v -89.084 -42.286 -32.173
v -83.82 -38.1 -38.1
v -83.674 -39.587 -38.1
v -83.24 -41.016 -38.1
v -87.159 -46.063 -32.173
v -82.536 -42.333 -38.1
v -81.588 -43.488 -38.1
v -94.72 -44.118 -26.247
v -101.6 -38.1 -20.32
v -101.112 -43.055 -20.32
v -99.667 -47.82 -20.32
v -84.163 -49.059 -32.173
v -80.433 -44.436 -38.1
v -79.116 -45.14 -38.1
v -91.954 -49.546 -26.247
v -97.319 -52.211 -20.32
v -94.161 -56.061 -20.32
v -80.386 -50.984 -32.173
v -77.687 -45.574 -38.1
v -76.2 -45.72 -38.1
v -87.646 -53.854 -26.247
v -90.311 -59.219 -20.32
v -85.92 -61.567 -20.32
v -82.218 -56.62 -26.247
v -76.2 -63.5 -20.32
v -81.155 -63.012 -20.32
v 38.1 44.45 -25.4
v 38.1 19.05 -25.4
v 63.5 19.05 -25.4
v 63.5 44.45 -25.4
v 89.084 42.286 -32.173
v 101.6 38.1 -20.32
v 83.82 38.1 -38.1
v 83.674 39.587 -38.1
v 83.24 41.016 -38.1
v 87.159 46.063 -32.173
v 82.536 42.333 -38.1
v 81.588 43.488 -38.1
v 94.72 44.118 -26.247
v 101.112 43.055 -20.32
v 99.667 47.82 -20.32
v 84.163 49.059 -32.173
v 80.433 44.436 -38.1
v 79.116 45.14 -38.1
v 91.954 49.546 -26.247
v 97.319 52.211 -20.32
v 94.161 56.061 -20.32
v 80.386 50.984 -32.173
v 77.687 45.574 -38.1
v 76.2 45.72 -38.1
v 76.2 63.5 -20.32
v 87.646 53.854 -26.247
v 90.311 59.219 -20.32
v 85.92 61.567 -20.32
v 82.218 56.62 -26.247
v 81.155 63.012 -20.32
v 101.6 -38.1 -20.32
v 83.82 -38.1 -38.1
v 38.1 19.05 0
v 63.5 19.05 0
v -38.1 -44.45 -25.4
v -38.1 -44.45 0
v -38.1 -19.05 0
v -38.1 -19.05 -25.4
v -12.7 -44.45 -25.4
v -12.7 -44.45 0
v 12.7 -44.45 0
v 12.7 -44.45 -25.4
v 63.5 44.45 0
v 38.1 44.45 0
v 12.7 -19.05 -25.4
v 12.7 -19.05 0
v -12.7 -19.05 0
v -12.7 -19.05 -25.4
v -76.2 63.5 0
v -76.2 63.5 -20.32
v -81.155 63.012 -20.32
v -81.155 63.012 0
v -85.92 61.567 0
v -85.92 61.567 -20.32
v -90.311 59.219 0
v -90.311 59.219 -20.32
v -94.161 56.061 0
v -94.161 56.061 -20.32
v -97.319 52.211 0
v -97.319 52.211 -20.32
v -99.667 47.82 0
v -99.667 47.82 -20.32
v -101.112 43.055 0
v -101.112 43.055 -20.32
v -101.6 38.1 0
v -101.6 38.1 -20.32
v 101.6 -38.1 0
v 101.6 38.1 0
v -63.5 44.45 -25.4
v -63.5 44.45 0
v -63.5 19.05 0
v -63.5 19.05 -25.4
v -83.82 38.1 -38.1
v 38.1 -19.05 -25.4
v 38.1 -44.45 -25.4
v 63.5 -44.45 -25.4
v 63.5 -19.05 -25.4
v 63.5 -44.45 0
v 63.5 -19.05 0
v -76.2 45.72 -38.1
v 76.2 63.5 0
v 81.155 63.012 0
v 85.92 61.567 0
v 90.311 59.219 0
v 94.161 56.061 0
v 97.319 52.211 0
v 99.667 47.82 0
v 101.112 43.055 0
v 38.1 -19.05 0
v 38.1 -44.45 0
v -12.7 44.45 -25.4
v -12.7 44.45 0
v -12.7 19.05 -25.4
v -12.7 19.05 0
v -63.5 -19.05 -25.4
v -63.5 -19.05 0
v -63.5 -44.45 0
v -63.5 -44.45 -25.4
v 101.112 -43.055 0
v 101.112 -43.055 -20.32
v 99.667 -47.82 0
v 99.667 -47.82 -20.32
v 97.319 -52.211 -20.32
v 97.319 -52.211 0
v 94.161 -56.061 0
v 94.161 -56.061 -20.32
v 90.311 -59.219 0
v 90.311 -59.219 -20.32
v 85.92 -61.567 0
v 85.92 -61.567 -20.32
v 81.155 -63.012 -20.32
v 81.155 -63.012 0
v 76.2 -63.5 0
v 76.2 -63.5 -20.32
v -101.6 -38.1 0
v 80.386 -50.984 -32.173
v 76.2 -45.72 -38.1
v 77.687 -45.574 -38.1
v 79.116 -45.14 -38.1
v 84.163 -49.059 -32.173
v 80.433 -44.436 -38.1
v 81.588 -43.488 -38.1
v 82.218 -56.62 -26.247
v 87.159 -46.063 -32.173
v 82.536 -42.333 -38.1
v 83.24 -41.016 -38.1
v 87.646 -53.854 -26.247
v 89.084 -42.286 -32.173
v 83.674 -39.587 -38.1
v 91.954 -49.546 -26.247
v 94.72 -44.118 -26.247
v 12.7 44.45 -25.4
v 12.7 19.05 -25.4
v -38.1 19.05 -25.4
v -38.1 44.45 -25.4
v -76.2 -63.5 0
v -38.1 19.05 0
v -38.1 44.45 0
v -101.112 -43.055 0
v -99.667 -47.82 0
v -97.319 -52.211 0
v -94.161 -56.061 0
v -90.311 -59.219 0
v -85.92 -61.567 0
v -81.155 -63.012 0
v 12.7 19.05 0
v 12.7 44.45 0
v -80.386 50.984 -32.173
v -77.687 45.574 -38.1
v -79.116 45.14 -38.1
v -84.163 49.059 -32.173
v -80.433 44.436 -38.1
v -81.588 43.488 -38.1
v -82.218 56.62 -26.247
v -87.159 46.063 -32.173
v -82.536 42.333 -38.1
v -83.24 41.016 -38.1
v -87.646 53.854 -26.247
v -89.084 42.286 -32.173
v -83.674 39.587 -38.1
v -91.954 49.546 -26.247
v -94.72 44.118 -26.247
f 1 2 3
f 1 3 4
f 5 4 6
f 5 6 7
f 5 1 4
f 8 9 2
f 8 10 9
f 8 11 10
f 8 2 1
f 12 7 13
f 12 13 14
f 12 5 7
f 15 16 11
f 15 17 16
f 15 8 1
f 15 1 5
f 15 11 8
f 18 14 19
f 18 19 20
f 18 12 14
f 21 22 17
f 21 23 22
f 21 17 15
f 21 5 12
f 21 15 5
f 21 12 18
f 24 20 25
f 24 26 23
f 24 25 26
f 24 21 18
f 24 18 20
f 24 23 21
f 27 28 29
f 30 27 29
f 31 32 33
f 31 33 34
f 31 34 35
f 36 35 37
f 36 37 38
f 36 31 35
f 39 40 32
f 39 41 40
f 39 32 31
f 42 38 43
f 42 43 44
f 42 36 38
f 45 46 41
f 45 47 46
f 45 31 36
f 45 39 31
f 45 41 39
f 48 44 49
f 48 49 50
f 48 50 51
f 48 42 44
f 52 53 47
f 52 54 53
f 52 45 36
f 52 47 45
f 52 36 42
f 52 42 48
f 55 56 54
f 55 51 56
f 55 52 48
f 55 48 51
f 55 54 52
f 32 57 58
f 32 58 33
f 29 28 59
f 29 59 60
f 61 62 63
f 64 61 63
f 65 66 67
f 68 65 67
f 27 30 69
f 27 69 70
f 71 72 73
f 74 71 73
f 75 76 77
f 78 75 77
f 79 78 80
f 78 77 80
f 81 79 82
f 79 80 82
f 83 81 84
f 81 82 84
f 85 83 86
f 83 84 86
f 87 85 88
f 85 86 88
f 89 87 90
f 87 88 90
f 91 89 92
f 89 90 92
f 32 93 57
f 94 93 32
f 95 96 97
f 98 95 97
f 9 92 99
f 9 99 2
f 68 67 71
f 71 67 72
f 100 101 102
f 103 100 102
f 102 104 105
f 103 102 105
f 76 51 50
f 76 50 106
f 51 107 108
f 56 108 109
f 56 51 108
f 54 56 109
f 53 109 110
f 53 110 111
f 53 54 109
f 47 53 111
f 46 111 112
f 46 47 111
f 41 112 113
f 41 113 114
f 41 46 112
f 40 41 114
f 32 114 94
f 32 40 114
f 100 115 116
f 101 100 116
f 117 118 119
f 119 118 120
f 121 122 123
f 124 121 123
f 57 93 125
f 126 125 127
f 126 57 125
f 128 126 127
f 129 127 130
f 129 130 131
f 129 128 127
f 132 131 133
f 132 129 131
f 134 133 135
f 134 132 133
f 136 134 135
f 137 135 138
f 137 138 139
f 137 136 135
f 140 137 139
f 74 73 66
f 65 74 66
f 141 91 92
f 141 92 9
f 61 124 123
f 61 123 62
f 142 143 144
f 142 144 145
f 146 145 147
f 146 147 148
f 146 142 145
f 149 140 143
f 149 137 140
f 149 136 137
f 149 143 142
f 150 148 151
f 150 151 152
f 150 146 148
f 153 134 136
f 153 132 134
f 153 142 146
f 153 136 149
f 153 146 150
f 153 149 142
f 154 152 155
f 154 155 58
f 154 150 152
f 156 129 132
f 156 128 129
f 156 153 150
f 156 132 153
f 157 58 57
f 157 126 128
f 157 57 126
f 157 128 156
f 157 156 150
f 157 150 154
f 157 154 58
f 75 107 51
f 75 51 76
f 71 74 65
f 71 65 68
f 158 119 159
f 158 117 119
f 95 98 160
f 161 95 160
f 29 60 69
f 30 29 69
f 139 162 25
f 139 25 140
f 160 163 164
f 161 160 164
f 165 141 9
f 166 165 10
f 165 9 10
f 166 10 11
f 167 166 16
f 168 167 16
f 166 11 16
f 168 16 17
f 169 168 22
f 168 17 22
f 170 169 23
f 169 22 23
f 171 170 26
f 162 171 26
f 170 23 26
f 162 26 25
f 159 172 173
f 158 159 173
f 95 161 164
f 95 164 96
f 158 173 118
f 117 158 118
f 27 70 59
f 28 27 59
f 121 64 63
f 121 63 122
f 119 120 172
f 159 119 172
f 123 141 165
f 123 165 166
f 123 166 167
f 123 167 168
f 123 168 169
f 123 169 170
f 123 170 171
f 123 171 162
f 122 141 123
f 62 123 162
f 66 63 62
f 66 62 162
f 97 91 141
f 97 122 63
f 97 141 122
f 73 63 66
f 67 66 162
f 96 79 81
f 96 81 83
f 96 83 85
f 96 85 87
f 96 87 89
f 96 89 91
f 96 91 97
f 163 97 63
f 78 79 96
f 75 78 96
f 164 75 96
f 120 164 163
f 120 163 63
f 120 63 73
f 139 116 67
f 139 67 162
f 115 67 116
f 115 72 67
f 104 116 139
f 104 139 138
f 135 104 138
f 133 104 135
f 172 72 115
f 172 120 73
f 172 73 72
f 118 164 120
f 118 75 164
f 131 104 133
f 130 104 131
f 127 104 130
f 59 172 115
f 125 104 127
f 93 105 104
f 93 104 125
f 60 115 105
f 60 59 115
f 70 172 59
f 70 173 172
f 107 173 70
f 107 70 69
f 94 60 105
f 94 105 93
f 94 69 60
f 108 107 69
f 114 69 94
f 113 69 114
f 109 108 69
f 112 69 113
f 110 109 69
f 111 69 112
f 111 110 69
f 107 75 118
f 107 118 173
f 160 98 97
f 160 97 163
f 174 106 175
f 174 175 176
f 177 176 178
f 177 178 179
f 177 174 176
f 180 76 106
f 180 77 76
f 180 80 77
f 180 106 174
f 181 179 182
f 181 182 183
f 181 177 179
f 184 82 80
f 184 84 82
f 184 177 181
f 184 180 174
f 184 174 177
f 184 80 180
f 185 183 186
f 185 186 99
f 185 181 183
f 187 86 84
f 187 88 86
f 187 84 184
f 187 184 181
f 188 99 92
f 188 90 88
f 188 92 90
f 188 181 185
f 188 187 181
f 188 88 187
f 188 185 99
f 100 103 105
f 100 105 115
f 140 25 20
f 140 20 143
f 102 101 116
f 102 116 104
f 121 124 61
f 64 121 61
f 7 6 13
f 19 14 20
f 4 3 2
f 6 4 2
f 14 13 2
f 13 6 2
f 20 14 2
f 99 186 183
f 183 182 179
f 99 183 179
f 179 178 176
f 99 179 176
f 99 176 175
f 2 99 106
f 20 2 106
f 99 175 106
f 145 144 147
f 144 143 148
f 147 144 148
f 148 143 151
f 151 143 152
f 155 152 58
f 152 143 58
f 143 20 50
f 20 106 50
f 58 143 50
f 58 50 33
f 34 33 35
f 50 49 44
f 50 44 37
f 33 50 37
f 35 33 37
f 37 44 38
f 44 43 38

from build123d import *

# Parameters (mm, degrees)
F0_W     = 12.7
F0_H     = 12.7
F1_DEPTH = 38.1
F2_DEPTH = 25.4
F3_R     = 25.4
F4_SIZE  = 17.78


with BuildPart() as f1:
    # F0 (on Top) → F1 (new body)
    with BuildSketch(Plane.XY):
        Polygon((101.6, 63.5), (-101.6, 63.5), (-101.6, 31.75), (-63.5, 31.75), (-63.5, 44.45), (-38.1, 44.45), (-38.1, 31.75), (-12.7, 31.75), (-12.7, 44.45), (12.7, 44.45), (12.7, 31.75), (38.1, 31.75), (38.1, 44.45), (63.5, 44.45), (63.5, 31.75), (101.6, 31.75), align=None)
        Polygon((-63.5, 31.75), (-101.6, 31.75), (-101.6, -31.75), (-63.5, -31.75), (-63.5, -19.05), (-38.1, -19.05), (-38.1, -31.75), (-12.7, -31.75), (-12.7, -19.05), (0, -19.05), (0, 0), (0, 19.05), (-12.7, 19.05), (-12.7, 31.75), (-38.1, 31.75), (-38.1, 19.05), (-63.5, 19.05), align=None)
        Polygon((101.6, -31.75), (101.6, 31.75), (63.5, 31.75), (63.5, 19.05), (38.1, 19.05), (38.1, 31.75), (12.7, 31.75), (12.7, 19.05), (0, 19.05), (0, 0), (0, -19.05), (12.7, -19.05), (12.7, -31.75), (38.1, -31.75), (38.1, -19.05), (63.5, -19.05), (63.5, -31.75), align=None)
        Polygon((-63.5, -31.75), (-101.6, -31.75), (-101.6, -63.5), (101.6, -63.5), (101.6, -31.75), (63.5, -31.75), (63.5, -44.45), (38.1, -44.45), (38.1, -31.75), (12.7, -31.75), (12.7, -44.45), (-12.7, -44.45), (-12.7, -31.75), (-38.1, -31.75), (-38.1, -44.45), (-63.5, -44.45), align=None)
        Polygon((-50.8, 31.75), (-63.5, 31.75), (-63.5, 19.05), (-38.1, 19.05), (-38.1, 31.75), align=None)
        Polygon((-63.5, 44.45), (-63.5, 31.75), (-50.8, 31.75), (-38.1, 31.75), (-38.1, 44.45), align=None)
        Polygon((-12.7, 44.45), (-12.7, 31.75), (0, 31.75), (12.7, 31.75), (12.7, 44.45), align=None)
        with Locations((-6.35, 25.4)):
            Rectangle(F0_W, F0_H)
        with Locations((6.35, 25.4)):
            Rectangle(F0_W, F0_H)
        Polygon((63.5, 19.05), (63.5, 31.75), (50.8, 31.75), (38.1, 31.75), (38.1, 19.05), align=None)
        Polygon((50.8, 31.75), (63.5, 31.75), (63.5, 44.45), (38.1, 44.45), (38.1, 31.75), align=None)
        Polygon((50.8, -31.75), (63.5, -31.75), (63.5, -19.05), (38.1, -19.05), (38.1, -31.75), align=None)
        Polygon((63.5, -44.45), (63.5, -31.75), (50.8, -31.75), (38.1, -31.75), (38.1, -44.45), align=None)
        Polygon((0, -31.75), (-12.7, -31.75), (-12.7, -44.45), (12.7, -44.45), (12.7, -31.75), align=None)
        with Locations((-6.35, -25.4)):
            Rectangle(F0_W, F0_H)
        with Locations((6.35, -25.4)):
            Rectangle(F0_W, F0_H)
        Polygon((-63.5, -19.05), (-63.5, -31.75), (-50.8, -31.75), (-38.1, -31.75), (-38.1, -19.05), align=None)
        Polygon((-50.8, -31.75), (-63.5, -31.75), (-63.5, -44.45), (-38.1, -44.45), (-38.1, -31.75), align=None)
    extrude(amount=-F1_DEPTH)

    # F0 (on Top) → F2 (cut)
    with BuildSketch(Plane.XY):
        Polygon((-63.5, 44.45), (-63.5, 31.75), (-50.8, 31.75), (-38.1, 31.75), (-38.1, 44.45), align=None)
        Polygon((-50.8, 31.75), (-63.5, 31.75), (-63.5, 19.05), (-38.1, 19.05), (-38.1, 31.75), align=None)
        Polygon((-63.5, -19.05), (-63.5, -31.75), (-50.8, -31.75), (-38.1, -31.75), (-38.1, -19.05), align=None)
        Polygon((-50.8, -31.75), (-63.5, -31.75), (-63.5, -44.45), (-38.1, -44.45), (-38.1, -31.75), align=None)
        with Locations((-6.35, -25.4)):
            Rectangle(F0_W, F0_H)
        with Locations((6.35, -25.4)):
            Rectangle(F0_W, F0_H)
        with Locations((-6.35, 25.4)):
            Rectangle(F0_W, F0_H)
        with Locations((6.35, 25.4)):
            Rectangle(F0_W, F0_H)
        Polygon((-12.7, 44.45), (-12.7, 31.75), (0, 31.75), (12.7, 31.75), (12.7, 44.45), align=None)
        Polygon((0, -31.75), (-12.7, -31.75), (-12.7, -44.45), (12.7, -44.45), (12.7, -31.75), align=None)
        Polygon((63.5, -44.45), (63.5, -31.75), (50.8, -31.75), (38.1, -31.75), (38.1, -44.45), align=None)
        Polygon((50.8, -31.75), (63.5, -31.75), (63.5, -19.05), (38.1, -19.05), (38.1, -31.75), align=None)
        Polygon((63.5, 19.05), (63.5, 31.75), (50.8, 31.75), (38.1, 31.75), (38.1, 19.05), align=None)
        Polygon((50.8, 31.75), (63.5, 31.75), (63.5, 44.45), (38.1, 44.45), (38.1, 31.75), align=None)
    extrude(amount=-F2_DEPTH, mode=Mode.SUBTRACT)

    # F3
    f3_edges = [f1.edges().sort_by_distance(p)[0] for p in [
        (-101.6, -63.5, -19.05),
        (101.6, -63.5, -19.05),
        (101.6, 63.5, -19.05),
        (-101.6, 63.5, -19.05),
    ]]
    fillet(f3_edges, radius=F3_R)

    # F4
    f4_edges = [f1.edges().sort_by_distance(p)[0] for p in [
        (0, -63.5, -38.1),
    ]]
    chamfer(f4_edges, length=F4_SIZE)


solid = f1.part
